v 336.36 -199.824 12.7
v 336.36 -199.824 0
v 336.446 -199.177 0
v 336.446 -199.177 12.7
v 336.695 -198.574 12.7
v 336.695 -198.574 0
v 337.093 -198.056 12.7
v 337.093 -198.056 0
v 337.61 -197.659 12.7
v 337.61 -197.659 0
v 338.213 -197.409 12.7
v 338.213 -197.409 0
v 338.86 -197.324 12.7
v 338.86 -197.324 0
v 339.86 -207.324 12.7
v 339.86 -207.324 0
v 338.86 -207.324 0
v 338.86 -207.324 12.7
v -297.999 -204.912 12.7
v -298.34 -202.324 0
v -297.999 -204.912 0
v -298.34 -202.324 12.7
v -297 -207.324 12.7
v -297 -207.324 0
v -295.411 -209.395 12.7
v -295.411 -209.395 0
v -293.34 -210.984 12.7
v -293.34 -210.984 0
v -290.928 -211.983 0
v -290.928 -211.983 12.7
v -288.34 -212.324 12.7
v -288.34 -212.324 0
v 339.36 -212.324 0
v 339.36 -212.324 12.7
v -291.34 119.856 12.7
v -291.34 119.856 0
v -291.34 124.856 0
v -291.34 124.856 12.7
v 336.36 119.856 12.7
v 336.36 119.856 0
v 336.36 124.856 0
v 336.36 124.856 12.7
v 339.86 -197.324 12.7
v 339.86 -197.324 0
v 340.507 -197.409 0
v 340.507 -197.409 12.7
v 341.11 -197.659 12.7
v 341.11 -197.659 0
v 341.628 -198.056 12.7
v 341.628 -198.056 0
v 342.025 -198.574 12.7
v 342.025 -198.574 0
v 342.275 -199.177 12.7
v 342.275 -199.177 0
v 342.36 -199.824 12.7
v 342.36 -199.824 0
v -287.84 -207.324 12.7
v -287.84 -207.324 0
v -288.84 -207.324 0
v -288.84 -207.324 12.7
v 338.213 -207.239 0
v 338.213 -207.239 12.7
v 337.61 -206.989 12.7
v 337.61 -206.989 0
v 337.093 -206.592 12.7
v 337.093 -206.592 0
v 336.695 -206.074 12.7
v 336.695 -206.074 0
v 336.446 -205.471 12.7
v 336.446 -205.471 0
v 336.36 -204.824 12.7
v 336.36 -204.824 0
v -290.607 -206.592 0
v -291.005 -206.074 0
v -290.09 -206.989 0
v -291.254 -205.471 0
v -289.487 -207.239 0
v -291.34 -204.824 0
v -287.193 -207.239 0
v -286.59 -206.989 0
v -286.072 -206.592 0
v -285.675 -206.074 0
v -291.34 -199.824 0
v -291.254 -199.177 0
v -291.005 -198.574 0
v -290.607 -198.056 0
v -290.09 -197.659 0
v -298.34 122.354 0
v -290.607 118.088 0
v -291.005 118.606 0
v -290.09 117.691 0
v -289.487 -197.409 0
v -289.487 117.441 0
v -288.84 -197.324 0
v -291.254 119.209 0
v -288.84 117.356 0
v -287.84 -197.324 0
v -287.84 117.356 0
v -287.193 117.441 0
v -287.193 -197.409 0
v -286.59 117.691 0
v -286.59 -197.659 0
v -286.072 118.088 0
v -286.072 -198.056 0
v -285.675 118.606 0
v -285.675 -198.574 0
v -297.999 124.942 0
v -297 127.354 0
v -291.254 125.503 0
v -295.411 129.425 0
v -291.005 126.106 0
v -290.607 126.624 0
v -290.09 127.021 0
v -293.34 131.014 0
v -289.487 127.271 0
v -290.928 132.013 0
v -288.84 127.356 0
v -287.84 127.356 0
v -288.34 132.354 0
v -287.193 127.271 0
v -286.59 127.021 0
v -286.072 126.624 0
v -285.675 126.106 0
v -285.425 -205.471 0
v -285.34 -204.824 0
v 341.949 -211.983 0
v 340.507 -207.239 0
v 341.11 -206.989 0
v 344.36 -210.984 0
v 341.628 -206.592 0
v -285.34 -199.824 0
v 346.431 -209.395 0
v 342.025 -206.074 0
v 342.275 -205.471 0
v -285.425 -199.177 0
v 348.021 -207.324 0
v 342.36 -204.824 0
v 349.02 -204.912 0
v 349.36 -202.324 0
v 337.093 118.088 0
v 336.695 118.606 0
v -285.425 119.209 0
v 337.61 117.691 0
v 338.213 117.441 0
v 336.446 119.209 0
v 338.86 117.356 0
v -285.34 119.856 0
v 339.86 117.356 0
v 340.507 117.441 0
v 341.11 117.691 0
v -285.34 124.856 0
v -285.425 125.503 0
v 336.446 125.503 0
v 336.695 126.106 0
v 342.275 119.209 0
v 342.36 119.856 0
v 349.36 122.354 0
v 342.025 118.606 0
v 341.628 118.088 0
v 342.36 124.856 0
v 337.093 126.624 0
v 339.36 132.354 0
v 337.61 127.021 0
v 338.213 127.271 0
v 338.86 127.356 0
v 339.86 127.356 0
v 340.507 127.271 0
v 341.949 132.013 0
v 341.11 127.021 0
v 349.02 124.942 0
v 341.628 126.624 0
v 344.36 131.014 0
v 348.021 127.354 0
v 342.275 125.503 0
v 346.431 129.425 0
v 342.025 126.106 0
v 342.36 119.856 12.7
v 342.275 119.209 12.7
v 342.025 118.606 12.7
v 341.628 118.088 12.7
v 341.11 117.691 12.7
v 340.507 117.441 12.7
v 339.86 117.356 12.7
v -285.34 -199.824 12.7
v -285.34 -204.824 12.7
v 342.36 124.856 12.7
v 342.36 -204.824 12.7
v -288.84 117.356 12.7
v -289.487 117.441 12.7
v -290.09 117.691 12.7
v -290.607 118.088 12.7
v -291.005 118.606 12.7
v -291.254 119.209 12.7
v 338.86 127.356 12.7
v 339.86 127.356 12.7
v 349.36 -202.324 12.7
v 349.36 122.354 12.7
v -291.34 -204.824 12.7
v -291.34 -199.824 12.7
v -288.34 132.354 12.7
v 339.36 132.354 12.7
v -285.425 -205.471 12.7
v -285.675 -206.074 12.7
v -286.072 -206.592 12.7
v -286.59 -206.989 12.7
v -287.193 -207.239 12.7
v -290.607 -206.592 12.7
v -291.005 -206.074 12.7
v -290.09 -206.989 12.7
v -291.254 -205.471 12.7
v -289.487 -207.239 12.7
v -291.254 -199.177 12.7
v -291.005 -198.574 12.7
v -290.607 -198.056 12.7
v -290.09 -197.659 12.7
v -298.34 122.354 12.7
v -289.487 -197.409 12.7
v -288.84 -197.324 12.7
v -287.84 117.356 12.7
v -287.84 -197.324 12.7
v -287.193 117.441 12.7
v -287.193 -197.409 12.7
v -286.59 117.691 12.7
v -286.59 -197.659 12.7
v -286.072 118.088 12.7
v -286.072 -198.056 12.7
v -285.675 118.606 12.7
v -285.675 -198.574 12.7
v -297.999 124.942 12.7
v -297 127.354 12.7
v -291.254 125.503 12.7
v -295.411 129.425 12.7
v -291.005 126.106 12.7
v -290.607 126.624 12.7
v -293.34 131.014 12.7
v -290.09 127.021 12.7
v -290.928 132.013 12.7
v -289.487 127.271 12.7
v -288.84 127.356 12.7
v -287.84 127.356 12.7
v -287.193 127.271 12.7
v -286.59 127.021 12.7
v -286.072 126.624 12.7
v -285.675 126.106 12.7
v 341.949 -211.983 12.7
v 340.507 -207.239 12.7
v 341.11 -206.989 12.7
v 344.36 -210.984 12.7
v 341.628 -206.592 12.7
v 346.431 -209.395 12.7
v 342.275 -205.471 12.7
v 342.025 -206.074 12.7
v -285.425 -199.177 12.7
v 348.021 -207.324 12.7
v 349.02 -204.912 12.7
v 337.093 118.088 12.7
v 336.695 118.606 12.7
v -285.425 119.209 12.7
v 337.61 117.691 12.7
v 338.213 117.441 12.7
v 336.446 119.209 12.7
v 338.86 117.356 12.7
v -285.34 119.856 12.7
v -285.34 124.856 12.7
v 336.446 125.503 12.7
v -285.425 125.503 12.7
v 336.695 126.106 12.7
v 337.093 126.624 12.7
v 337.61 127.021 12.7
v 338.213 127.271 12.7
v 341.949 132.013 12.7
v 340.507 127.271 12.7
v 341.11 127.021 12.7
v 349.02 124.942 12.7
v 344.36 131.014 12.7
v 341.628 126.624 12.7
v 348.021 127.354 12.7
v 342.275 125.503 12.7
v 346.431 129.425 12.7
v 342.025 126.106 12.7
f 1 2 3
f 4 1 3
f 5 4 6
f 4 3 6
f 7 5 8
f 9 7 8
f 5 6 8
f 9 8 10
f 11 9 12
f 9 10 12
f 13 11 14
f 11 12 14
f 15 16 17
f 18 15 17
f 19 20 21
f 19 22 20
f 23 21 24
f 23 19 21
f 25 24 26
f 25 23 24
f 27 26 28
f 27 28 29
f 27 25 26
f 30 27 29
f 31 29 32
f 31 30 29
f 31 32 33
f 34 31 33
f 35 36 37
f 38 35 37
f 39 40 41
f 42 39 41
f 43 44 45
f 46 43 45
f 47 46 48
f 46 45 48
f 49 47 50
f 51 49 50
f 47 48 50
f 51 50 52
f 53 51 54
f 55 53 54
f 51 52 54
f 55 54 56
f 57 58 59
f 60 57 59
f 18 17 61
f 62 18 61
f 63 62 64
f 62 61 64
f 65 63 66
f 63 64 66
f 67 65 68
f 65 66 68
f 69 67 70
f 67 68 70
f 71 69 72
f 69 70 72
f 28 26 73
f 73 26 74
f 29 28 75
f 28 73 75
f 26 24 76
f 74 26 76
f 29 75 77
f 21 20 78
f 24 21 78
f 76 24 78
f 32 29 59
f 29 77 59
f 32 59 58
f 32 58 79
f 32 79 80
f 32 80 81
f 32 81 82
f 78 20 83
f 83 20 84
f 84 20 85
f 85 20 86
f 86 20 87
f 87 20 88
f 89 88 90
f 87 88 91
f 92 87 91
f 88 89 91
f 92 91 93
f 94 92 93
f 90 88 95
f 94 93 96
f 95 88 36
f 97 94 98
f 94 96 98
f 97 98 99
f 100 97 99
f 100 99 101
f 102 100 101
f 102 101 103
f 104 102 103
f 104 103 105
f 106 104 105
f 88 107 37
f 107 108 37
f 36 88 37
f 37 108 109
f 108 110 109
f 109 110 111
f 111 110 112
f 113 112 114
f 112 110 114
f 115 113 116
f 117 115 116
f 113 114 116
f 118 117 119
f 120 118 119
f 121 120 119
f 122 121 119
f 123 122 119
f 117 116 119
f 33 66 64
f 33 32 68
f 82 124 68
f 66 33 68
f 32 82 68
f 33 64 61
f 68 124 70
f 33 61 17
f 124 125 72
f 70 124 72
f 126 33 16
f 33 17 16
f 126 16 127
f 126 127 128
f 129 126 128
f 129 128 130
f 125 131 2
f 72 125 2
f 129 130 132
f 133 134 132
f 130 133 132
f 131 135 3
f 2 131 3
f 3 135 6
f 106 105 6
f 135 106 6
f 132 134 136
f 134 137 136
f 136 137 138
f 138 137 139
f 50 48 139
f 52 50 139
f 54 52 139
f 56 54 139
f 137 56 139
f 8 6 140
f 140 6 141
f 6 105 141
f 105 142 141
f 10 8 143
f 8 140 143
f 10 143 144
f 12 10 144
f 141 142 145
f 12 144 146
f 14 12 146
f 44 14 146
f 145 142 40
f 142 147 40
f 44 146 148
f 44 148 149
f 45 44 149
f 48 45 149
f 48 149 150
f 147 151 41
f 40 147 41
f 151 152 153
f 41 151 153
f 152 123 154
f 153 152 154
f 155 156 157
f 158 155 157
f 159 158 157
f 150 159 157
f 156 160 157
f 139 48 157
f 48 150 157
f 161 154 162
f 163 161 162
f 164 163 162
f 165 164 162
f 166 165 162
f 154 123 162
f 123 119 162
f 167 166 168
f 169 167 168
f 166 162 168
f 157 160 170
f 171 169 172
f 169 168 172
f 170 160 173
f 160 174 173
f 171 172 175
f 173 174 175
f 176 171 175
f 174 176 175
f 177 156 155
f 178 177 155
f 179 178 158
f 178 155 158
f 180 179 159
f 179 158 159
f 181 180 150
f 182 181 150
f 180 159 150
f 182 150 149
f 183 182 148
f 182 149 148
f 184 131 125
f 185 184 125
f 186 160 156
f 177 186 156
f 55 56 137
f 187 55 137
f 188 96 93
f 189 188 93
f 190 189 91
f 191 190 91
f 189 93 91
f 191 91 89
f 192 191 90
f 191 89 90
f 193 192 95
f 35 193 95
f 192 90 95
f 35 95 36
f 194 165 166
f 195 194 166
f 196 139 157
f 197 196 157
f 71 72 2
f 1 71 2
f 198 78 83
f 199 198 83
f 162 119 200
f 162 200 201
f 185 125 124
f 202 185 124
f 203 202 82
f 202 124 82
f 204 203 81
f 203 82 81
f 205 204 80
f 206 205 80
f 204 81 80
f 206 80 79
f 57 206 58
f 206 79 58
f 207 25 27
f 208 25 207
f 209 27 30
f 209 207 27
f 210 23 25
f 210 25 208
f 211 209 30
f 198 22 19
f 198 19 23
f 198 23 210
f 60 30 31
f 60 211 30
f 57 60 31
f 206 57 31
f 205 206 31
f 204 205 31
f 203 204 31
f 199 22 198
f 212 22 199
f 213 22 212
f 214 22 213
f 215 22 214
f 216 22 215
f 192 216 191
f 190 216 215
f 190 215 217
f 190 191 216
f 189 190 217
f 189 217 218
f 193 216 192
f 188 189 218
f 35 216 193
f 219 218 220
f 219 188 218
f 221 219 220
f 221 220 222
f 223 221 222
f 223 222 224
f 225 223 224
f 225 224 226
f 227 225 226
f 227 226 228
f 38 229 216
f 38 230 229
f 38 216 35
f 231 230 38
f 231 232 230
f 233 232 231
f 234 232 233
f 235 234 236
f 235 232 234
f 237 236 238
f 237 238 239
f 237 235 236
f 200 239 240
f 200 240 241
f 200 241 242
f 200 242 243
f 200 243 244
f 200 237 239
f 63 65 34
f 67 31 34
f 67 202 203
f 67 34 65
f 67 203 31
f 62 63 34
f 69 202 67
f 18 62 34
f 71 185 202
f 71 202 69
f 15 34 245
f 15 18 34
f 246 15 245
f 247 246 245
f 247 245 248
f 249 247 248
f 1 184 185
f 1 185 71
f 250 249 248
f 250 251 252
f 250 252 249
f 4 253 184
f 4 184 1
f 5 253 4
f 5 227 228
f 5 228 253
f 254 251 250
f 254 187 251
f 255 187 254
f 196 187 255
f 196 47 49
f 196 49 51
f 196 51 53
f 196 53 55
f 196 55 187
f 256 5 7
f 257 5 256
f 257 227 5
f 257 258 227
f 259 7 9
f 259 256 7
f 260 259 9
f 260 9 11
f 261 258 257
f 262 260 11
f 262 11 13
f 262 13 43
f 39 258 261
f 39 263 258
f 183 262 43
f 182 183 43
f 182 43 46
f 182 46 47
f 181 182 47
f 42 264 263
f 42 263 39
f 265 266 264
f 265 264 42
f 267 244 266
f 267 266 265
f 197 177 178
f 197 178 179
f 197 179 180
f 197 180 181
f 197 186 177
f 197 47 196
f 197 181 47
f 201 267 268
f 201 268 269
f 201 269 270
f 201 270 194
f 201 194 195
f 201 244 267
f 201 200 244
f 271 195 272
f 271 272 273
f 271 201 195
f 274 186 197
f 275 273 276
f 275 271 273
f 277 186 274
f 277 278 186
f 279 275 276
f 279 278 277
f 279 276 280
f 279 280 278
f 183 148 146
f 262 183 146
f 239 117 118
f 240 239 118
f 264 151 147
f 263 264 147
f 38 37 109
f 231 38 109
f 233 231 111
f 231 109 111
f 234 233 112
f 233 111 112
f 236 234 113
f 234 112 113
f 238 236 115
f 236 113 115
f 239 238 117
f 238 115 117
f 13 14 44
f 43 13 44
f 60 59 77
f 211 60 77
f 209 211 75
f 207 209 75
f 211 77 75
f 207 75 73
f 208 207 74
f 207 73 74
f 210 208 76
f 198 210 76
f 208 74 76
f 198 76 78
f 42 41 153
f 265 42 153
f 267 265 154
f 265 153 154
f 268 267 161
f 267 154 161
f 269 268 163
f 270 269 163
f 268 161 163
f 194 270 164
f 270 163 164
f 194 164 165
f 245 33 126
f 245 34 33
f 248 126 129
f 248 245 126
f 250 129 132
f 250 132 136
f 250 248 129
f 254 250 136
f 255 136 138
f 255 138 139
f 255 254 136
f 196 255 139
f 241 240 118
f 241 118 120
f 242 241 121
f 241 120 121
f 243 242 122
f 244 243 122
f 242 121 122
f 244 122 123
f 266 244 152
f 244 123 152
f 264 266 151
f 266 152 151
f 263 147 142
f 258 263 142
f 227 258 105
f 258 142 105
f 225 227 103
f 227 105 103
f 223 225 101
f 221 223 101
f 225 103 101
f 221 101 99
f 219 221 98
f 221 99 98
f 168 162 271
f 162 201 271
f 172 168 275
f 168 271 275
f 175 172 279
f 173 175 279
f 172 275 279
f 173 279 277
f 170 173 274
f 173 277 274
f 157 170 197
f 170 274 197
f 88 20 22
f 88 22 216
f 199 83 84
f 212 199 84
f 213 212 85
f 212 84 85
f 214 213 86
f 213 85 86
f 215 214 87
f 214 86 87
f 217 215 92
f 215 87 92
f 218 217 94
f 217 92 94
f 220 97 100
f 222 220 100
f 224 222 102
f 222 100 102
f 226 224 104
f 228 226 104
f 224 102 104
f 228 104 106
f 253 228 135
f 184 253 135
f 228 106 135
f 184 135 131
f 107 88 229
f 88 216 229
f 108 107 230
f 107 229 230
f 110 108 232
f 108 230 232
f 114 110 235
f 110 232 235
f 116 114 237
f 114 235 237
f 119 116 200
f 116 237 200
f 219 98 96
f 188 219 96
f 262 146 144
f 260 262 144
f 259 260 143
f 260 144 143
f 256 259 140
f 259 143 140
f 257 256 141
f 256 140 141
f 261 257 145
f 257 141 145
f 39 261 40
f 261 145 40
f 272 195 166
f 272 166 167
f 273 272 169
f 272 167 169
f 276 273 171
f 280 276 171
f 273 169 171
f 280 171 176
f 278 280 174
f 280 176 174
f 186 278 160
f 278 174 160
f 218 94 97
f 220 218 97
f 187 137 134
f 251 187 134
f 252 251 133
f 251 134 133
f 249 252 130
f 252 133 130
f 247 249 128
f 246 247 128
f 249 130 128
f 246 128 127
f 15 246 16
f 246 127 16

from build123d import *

# Parameters (mm, degrees)
SKETCH1_W           = 647.7
SKETCH1_H           = 344.678
BOSS_EXTRUDE1_DEPTH = 12.7
FILLET1_R           = 10
FILLET2_R           = 10


with BuildPart() as part:
    # Sketch1 → Boss-Extrude1 (new body)
    with BuildSketch(Plane.XY):
        with Locations((25.51036036, -39.985171171)):
            Rectangle(SKETCH1_W, SKETCH1_H)
        with BuildLine():
            Line((339.86036036, -207.324171171), (338.86036036, -207.324171171))
            ThreePointArc((338.86036036, -207.324171171), (337.092593407, -206.591938124), (336.36036036, -204.824171171))
            Line((336.36036036, -204.824171171), (336.36036036, -199.824171171))
            ThreePointArc((336.36036036, -199.824171171), (337.092593407, -198.056404218), (338.86036036, -197.324171171))
            Line((338.86036036, -197.324171171), (339.86036036, -197.324171171))
            ThreePointArc((339.86036036, -197.324171171), (341.628127313, -198.056404218), (342.36036036, -199.824171171))
            Line((342.36036036, -199.824171171), (342.36036036, -204.824171171))
            ThreePointArc((342.36036036, -204.824171171), (341.628127313, -206.591938124), (339.86036036, -207.324171171))
        make_face(mode=Mode.SUBTRACT)
        with BuildLine():
            Line((-287.83963964, -207.324171171), (-288.83963964, -207.324171171))
            ThreePointArc((-288.83963964, -207.324171171), (-290.607406593, -206.591938124), (-291.33963964, -204.824171171))
            Line((-291.33963964, -204.824171171), (-291.33963964, -199.824171171))
            ThreePointArc((-291.33963964, -199.824171171), (-290.607406593, -198.056404218), (-288.83963964, -197.324171171))
            Line((-288.83963964, -197.324171171), (-287.83963964, -197.324171171))
            ThreePointArc((-287.83963964, -197.324171171), (-286.071872687, -198.056404218), (-285.33963964, -199.824171171))
            Line((-285.33963964, -199.824171171), (-285.33963964, -204.824171171))
            ThreePointArc((-285.33963964, -204.824171171), (-286.071872687, -206.591938124), (-287.83963964, -207.324171171))
        make_face(mode=Mode.SUBTRACT)
        with BuildLine():
            Line((-287.83963964, 117.355828829), (-288.83963964, 117.355828829))
            ThreePointArc((-288.83963964, 117.355828829), (-290.607406593, 118.088061876), (-291.33963964, 119.855828829))
            Line((-291.33963964, 119.855828829), (-291.33963964, 124.855828829))
            ThreePointArc((-291.33963964, 124.855828829), (-290.607406593, 126.623595782), (-288.83963964, 127.355828829))
            Line((-288.83963964, 127.355828829), (-287.83963964, 127.355828829))
            ThreePointArc((-287.83963964, 127.355828829), (-286.071872687, 126.623595782), (-285.33963964, 124.855828829))
            Line((-285.33963964, 124.855828829), (-285.33963964, 119.855828829))
            ThreePointArc((-285.33963964, 119.855828829), (-286.071872687, 118.088061876), (-287.83963964, 117.355828829))
        make_face(mode=Mode.SUBTRACT)
        with BuildLine():
            Line((339.86036036, 117.355828829), (338.86036036, 117.355828829))
            ThreePointArc((338.86036036, 117.355828829), (337.092593407, 118.088061876), (336.36036036, 119.855828829))
            Line((336.36036036, 119.855828829), (336.36036036, 124.855828829))
            ThreePointArc((336.36036036, 124.855828829), (337.092593407, 126.623595782), (338.86036036, 127.355828829))
            Line((338.86036036, 127.355828829), (339.86036036, 127.355828829))
            ThreePointArc((339.86036036, 127.355828829), (341.628127313, 126.623595782), (342.36036036, 124.855828829))
            Line((342.36036036, 124.855828829), (342.36036036, 119.855828829))
            ThreePointArc((342.36036036, 119.855828829), (341.628127313, 118.088061876), (339.86036036, 117.355828829))
        make_face(mode=Mode.SUBTRACT)
    extrude(amount=BOSS_EXTRUDE1_DEPTH)

    # Fillet1
    fillet1_edges = [part.edges().sort_by_distance(p)[0] for p in [
        (-298.33963964, 132.353828829, 6.35),
        (349.36036036, 132.353828829, 6.35),
        (349.36036036, -212.324171171, 6.35),
    ]]
    fillet(fillet1_edges, radius=FILLET1_R)

    # Fillet2
    fillet2_edges = [part.edges().sort_by_distance(p)[0] for p in [
        (-298.33963964, -212.324171171, 6.35),
    ]]
    fillet(fillet2_edges, radius=FILLET2_R)


solid = part.part
